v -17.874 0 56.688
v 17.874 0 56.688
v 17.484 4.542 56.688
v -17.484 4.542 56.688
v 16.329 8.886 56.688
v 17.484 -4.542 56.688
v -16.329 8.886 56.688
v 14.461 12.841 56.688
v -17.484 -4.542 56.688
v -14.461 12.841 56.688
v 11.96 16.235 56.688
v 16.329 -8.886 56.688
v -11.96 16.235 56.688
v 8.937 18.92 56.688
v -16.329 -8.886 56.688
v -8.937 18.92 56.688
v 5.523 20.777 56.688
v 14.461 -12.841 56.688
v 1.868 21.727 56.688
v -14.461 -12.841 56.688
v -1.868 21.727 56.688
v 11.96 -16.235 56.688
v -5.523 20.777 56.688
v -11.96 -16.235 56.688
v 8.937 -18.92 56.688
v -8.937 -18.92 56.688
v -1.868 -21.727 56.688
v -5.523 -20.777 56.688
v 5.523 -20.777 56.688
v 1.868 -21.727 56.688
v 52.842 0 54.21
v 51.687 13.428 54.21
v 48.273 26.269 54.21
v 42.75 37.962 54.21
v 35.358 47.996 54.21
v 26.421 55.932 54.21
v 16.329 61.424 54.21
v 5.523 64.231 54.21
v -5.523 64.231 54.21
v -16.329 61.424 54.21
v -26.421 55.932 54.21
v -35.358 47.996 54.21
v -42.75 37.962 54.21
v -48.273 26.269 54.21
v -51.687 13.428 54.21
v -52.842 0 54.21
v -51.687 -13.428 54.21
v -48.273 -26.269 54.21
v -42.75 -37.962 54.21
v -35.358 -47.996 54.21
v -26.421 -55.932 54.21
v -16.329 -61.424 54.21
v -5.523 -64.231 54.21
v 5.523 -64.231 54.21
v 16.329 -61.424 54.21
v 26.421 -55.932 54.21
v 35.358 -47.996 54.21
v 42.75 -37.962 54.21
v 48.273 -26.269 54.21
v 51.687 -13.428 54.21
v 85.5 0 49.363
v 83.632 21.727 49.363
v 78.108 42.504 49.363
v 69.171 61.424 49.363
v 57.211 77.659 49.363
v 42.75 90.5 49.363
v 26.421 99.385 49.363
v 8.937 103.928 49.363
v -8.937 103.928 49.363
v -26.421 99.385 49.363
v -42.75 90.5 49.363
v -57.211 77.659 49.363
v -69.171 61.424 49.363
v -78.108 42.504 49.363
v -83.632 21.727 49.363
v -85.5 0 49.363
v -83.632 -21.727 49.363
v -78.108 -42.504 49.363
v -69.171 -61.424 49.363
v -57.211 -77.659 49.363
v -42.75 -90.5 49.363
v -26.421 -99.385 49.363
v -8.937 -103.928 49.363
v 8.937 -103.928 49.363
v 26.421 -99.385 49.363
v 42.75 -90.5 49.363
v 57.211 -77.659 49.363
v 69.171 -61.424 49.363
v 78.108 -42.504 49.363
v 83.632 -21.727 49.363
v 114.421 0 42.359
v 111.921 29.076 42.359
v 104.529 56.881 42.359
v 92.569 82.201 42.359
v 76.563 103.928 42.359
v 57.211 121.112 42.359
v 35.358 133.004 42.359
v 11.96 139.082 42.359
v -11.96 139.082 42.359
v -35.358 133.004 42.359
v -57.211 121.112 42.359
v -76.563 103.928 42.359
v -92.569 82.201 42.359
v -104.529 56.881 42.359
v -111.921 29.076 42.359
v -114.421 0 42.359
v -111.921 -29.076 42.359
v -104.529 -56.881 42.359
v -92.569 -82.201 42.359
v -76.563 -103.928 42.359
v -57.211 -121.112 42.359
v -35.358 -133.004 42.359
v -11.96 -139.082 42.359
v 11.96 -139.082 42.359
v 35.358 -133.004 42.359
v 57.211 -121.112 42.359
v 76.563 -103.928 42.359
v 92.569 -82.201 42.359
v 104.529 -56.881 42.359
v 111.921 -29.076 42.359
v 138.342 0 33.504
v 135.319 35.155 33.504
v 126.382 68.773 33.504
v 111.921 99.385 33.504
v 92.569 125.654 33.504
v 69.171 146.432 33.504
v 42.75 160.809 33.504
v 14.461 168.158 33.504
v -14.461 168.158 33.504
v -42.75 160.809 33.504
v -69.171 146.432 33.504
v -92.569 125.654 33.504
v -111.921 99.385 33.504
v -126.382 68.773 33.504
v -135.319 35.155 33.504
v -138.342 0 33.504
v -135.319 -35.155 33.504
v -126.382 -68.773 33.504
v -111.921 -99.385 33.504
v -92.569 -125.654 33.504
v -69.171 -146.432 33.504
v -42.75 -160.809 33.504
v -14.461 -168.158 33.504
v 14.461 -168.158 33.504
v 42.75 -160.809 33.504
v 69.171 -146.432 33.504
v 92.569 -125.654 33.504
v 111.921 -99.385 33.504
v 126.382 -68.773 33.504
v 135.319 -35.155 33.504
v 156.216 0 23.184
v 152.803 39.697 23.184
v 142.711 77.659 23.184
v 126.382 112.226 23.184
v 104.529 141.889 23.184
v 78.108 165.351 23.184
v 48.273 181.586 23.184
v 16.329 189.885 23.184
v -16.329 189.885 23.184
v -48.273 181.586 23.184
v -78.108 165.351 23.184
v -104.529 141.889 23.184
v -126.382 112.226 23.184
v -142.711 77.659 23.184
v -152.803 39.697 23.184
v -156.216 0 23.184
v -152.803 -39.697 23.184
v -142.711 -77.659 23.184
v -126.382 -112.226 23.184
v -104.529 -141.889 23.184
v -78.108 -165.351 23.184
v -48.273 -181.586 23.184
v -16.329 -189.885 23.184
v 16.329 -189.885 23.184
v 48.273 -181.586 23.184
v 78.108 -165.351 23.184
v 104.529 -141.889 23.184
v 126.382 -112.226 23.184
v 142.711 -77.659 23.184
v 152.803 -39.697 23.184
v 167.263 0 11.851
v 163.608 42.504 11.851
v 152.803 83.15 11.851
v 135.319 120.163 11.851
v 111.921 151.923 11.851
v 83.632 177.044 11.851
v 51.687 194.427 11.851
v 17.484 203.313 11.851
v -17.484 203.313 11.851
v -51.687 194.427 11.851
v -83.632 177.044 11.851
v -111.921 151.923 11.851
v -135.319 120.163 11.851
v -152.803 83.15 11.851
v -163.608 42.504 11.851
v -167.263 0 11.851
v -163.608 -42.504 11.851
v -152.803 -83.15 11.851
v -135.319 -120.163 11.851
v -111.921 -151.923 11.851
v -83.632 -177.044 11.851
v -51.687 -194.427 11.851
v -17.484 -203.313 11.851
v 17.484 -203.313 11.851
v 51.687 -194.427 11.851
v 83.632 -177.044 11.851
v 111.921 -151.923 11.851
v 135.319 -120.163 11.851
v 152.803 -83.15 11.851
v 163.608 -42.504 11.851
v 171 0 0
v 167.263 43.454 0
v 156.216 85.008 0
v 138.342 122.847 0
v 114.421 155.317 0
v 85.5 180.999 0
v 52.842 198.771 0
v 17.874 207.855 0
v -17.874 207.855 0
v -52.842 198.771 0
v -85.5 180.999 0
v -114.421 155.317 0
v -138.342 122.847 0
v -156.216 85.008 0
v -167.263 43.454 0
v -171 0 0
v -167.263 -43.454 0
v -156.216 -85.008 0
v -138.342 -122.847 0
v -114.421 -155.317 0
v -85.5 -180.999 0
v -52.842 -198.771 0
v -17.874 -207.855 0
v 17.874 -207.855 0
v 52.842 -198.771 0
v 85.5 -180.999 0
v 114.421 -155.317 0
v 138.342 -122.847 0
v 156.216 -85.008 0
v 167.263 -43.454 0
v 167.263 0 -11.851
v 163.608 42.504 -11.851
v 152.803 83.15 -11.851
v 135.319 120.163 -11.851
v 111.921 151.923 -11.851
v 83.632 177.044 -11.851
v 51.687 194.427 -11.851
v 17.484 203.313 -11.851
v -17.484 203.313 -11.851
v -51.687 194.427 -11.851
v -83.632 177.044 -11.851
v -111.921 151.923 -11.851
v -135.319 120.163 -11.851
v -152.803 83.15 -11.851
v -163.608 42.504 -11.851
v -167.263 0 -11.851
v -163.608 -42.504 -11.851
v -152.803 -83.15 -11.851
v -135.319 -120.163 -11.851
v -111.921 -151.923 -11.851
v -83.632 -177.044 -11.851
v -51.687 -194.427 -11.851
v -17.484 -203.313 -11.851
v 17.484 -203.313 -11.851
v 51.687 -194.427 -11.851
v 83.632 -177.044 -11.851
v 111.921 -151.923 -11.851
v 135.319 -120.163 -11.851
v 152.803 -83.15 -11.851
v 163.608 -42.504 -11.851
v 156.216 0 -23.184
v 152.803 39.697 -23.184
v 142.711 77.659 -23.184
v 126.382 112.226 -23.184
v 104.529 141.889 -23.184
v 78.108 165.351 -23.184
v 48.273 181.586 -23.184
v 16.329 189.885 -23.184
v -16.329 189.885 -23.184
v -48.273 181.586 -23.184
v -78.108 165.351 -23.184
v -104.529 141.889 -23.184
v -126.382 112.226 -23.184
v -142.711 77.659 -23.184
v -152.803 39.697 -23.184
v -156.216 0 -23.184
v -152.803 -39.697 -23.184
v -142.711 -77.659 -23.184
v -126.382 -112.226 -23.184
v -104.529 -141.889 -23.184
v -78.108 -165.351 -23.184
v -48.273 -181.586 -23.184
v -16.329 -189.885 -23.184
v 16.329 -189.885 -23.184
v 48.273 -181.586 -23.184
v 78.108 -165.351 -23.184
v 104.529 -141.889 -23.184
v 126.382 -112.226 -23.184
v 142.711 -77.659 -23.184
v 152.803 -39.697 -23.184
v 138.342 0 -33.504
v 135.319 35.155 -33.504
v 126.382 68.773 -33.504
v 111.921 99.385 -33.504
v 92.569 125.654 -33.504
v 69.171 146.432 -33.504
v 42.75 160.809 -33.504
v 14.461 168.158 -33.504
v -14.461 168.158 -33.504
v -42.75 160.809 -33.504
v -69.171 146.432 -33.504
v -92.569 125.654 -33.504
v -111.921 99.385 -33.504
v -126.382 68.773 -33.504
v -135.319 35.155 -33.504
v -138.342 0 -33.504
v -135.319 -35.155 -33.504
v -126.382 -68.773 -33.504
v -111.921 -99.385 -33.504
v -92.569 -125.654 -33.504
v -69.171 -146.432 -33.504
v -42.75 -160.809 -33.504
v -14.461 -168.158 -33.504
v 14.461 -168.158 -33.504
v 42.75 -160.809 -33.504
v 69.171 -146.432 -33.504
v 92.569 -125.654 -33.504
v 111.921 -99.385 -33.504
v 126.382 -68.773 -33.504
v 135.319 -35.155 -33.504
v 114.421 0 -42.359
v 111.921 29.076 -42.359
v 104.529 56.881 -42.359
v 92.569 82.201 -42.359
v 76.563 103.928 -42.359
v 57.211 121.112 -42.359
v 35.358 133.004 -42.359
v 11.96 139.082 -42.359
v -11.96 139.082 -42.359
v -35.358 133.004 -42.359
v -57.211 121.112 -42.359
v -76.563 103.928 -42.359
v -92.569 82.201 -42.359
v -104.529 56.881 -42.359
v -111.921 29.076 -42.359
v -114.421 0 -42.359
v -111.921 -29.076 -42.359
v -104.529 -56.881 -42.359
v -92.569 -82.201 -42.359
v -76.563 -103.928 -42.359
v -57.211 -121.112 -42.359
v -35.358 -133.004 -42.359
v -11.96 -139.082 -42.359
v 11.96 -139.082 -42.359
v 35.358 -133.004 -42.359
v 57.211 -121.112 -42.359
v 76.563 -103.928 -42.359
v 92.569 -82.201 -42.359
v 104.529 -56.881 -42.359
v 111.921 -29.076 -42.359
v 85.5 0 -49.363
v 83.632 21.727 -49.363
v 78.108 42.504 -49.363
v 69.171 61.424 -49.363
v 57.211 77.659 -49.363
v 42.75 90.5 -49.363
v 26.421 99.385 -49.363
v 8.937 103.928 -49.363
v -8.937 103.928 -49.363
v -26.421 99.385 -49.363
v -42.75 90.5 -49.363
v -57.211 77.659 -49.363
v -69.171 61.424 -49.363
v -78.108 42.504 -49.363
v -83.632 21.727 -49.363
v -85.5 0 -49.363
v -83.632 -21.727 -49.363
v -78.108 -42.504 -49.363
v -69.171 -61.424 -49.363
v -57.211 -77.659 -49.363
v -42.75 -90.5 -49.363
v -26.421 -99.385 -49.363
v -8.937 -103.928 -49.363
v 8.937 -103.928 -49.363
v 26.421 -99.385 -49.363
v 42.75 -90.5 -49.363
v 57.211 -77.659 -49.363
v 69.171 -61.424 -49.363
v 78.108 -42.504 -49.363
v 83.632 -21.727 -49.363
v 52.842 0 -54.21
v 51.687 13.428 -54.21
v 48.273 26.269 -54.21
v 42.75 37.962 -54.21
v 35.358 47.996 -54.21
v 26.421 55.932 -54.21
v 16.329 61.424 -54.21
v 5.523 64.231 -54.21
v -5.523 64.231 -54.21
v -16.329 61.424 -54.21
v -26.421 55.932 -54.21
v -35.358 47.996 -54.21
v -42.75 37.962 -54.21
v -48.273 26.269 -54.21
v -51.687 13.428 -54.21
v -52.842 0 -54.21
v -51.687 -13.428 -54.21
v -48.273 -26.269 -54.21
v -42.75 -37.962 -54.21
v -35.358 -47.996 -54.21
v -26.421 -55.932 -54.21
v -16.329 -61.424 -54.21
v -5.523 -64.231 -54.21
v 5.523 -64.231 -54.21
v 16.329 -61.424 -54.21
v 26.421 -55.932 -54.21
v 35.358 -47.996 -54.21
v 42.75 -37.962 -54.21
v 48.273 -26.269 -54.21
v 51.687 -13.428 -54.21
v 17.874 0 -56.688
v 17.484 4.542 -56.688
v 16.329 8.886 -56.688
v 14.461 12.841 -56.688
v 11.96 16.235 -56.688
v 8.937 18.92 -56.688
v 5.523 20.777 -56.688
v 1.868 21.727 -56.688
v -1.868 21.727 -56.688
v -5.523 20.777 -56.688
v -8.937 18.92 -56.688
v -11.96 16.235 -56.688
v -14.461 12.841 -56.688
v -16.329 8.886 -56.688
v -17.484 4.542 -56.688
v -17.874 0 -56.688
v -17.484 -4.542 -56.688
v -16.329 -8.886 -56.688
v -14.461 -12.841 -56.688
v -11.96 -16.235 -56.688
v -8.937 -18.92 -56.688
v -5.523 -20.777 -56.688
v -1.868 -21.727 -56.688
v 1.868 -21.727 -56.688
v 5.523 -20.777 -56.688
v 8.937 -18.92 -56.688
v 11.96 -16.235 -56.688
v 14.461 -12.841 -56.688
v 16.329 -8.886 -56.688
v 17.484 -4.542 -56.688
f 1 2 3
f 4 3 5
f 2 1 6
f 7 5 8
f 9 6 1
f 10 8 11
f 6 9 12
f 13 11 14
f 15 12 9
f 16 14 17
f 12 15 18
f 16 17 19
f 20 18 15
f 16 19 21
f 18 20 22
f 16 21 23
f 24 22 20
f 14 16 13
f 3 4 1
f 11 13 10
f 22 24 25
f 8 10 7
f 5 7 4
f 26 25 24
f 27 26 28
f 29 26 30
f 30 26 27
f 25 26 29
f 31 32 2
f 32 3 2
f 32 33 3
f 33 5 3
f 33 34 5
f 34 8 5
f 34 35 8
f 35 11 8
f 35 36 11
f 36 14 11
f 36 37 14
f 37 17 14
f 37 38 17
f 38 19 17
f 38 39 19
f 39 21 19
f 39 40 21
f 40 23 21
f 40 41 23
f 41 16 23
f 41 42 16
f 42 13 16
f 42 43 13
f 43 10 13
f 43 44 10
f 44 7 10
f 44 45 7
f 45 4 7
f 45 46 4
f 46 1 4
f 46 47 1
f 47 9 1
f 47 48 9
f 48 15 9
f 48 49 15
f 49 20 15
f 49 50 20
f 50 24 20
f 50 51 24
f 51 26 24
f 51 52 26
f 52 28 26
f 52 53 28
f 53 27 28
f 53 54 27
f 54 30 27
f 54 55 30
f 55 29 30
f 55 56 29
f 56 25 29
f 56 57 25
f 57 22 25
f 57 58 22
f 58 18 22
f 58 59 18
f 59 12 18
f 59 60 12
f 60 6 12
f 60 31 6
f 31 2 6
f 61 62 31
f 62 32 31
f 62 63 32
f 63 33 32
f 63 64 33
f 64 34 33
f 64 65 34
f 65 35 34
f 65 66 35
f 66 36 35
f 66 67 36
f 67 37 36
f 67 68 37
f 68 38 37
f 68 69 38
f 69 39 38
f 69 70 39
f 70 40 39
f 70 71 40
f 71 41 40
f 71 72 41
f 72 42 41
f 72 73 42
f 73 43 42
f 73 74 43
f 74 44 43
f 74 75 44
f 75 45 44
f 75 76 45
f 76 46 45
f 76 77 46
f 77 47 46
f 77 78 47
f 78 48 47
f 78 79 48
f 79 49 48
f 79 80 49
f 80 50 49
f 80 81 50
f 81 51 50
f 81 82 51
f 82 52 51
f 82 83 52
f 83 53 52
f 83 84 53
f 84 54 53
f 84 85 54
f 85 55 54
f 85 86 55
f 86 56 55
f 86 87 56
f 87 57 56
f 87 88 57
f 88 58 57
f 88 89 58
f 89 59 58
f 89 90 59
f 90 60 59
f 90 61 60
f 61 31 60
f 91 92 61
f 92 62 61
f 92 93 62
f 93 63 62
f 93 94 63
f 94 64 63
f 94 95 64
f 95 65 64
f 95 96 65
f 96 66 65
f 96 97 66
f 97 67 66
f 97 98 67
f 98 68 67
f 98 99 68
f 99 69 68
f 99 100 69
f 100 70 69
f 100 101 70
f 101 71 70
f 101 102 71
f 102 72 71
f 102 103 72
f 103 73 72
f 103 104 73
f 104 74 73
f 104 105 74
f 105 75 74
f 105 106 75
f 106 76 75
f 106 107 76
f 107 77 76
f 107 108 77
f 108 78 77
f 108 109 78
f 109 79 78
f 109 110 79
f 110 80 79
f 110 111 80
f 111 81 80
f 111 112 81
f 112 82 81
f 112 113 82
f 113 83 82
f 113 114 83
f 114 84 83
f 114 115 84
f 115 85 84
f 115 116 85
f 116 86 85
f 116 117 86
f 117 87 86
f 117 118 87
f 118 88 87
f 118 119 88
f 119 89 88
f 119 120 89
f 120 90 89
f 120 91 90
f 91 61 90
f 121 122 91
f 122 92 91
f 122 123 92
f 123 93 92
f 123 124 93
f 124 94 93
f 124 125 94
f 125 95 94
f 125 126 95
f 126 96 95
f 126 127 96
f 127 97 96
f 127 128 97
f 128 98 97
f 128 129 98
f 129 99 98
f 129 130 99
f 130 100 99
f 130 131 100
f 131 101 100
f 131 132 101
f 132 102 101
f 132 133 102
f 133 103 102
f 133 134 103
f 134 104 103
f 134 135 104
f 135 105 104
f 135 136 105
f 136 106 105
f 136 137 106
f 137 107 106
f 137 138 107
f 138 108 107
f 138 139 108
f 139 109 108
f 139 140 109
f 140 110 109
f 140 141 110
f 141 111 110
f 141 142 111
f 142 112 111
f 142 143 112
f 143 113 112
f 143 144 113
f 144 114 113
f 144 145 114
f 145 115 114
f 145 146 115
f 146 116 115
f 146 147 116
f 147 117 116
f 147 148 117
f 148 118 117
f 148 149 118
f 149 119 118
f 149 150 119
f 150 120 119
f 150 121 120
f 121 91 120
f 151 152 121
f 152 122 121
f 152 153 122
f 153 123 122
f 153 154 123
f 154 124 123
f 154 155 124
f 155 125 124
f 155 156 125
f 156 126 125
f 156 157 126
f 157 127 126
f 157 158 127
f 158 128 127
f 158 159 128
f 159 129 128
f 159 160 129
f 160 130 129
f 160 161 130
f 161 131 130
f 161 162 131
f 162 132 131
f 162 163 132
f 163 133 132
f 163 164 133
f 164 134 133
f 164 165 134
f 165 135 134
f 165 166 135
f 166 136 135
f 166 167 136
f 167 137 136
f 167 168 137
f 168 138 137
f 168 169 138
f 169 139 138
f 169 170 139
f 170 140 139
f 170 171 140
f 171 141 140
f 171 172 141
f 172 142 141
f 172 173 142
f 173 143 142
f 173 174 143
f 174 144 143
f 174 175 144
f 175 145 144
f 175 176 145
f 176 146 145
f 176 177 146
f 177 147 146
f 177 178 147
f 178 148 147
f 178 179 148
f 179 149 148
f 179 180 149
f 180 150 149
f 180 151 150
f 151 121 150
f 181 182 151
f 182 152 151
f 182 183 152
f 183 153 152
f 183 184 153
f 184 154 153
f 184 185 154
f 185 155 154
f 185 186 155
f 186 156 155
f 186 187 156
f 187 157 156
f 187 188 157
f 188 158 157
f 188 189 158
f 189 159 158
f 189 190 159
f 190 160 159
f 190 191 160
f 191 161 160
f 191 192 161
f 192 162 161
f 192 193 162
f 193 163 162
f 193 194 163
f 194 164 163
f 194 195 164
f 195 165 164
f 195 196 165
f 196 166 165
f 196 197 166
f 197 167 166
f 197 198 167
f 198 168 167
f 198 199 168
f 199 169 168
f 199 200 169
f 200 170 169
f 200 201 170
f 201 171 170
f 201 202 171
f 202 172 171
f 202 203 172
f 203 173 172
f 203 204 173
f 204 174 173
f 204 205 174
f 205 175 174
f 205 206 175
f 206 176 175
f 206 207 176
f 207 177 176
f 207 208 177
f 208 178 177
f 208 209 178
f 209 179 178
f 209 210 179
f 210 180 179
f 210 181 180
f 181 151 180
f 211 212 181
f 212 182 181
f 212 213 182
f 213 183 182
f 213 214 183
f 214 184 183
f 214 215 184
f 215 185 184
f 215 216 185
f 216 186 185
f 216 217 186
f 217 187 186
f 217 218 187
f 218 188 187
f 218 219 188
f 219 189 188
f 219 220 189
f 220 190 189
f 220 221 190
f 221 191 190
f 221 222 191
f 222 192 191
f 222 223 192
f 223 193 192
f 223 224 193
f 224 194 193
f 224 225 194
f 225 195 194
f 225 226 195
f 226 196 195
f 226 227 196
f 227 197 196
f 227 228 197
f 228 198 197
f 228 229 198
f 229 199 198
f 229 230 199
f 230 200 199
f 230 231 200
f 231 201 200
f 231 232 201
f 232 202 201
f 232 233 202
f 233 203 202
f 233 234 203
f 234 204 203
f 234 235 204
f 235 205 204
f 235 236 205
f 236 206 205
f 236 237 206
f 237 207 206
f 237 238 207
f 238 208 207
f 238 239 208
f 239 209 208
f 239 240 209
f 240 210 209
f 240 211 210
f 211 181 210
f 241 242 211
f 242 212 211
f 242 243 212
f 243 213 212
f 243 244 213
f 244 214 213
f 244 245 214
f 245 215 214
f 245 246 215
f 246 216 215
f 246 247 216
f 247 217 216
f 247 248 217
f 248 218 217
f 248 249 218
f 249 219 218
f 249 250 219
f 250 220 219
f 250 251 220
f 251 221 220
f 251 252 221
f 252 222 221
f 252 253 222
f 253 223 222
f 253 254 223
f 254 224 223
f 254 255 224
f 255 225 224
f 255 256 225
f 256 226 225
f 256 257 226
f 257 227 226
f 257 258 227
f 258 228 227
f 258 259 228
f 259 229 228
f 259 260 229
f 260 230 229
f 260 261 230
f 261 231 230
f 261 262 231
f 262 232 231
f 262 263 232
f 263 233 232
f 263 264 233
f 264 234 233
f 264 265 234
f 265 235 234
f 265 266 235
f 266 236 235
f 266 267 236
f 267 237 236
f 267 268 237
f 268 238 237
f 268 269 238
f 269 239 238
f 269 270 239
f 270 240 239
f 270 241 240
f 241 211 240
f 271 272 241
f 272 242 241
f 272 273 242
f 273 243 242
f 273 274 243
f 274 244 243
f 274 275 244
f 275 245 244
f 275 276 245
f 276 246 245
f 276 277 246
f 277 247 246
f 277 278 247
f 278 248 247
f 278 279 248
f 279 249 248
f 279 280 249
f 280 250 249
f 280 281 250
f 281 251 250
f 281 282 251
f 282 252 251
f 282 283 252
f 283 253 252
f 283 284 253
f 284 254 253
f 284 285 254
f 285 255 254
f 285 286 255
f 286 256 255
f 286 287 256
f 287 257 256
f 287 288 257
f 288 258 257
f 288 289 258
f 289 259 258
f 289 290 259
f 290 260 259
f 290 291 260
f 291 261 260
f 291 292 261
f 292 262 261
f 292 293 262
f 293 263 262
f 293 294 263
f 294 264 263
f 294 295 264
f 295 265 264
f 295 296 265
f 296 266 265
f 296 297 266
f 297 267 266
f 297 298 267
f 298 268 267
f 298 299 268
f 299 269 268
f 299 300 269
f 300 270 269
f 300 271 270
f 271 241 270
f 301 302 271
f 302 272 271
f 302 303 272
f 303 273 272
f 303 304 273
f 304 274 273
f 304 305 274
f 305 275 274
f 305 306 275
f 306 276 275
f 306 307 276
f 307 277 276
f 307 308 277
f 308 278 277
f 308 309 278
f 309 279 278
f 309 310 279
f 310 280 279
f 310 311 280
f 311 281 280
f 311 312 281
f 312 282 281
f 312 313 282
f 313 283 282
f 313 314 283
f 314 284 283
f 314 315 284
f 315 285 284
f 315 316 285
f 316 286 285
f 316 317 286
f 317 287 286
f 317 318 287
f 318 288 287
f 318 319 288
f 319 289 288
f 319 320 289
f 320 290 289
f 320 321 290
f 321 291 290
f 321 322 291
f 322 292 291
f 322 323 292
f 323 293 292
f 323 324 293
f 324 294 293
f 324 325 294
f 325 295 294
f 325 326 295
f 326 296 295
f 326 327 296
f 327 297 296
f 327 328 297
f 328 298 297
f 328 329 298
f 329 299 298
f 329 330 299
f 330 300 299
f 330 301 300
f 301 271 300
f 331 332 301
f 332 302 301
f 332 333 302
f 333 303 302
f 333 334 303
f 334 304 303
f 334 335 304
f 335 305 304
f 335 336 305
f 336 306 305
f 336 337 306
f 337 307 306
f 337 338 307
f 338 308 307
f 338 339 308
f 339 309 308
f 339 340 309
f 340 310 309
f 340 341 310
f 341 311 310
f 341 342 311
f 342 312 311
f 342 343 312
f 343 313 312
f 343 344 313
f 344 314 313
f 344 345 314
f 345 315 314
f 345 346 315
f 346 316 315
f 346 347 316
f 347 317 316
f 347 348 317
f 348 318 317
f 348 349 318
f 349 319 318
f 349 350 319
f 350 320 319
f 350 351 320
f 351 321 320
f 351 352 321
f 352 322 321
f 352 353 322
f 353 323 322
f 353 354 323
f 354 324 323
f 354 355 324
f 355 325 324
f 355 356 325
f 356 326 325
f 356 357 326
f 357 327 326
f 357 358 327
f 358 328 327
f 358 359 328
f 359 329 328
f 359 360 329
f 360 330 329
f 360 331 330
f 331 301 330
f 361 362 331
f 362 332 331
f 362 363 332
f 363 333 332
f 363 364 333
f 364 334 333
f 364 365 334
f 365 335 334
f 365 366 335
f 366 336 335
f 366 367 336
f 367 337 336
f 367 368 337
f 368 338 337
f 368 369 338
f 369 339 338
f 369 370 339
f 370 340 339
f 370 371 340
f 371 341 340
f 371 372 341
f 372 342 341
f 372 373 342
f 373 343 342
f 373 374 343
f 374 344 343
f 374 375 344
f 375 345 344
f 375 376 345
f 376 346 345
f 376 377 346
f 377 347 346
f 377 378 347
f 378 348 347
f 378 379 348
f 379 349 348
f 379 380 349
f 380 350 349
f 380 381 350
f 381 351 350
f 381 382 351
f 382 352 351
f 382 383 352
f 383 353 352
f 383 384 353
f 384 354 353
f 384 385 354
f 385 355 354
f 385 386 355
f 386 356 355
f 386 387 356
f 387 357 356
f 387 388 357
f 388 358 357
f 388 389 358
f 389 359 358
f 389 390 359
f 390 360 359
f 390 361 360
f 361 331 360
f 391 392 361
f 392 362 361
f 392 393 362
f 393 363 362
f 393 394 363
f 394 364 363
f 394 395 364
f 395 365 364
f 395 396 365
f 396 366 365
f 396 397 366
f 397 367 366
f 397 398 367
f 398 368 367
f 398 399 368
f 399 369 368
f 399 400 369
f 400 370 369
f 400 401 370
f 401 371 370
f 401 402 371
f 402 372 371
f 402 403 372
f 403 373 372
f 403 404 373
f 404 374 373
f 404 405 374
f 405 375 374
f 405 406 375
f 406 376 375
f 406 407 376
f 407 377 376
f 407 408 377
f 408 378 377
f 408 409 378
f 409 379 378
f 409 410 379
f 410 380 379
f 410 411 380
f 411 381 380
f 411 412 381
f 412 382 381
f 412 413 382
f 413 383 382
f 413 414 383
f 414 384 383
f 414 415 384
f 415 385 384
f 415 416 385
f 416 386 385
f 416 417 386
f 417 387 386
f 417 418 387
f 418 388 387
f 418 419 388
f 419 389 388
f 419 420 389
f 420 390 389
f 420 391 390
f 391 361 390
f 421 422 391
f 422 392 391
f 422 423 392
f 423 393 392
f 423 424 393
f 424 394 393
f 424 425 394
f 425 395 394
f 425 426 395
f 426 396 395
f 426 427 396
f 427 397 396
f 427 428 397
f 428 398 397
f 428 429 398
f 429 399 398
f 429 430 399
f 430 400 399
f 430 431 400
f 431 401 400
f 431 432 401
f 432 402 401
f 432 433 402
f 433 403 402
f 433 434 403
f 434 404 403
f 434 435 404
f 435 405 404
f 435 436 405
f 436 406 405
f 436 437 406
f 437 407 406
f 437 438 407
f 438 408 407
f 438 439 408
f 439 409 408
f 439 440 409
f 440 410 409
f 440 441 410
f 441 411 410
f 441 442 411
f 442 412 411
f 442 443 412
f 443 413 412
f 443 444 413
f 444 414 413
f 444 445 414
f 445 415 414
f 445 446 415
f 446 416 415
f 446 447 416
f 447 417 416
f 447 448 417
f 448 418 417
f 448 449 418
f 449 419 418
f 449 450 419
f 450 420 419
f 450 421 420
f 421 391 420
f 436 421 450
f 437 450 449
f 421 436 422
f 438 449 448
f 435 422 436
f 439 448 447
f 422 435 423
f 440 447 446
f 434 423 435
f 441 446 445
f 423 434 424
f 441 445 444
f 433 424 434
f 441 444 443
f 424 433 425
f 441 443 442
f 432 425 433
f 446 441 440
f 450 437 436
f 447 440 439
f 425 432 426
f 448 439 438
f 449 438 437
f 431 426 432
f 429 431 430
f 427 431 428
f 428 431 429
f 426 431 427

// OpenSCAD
// Generated by SolidPython 1.0.1 on 2020-07-29 00:46:48


scale(v = [9, 11, 3]) {
	sphere(r = 19);
}
/***********************************************
*********      SolidPython code:      **********
************************************************
 
# import packages: SolidPython
from solid import *
from solid.utils import *
from itertools import chain, combinations, permutations


class Resize:

    def __init__(self, scad_file):
        self.scad_file = scad_file
        #self.scad_file = import_scad(scad_file)
        # cone/cylinder param:
        self.r1 = 0
        self.r2 = 0
        self.h = 0
        # rectangular prism param:
        self.w = 0
        self.l = 0
        # ellipse param:
        self.r = 0

    # import OpenScad code (file name corresponds to shape)


    # classify shape + parameters
    def assign(self, param1, param2, param3):
        if self.scad_file == 'cone.scad':
            self.r1 = param1
            self.r2 = param2
            self.h = param3
        elif self.scad_file == 'cylinder.scad':
            self.r1 = param1
            self.r2 = param2
            self.h = param3
        elif self.scad_file == 'rectangularPrism.scad':
            self.h = param1
            self.l = param2
            self.w = param3
        else:
            self.r = param1
            self.h = param2

    # resize parameters
    def iterate(self):
        x = range(3, 20, 2)
        i = 1
        if self.scad_file == 'cone.scad':
            tempList = list(permutations(x, 2))
            for temp in tempList:
                param1 = temp[0]
                param2 = temp[1]
                filepath = 'produced_scad_files/' + 'cone' + str(param1) + '_' + str(param2) + '_' + '.scad'
                scad_render_to_file(cylinder(h=param1, r1=param2, r2=0), filepath)

        elif self.scad_file == 'cylinder.scad':
            tempList = list(permutations(x, 3))
            for temp in tempList:
                param1 = temp[0]
                param2 = temp[1]
                filepath = 'produced_scad_files/' + 'cylinder' + str(param1) + '_' + str(param2) + '_' + '.scad'
                scad_render_to_file(cylinder(h=param1, r1=param2, r2=param2), filepath)

        elif self.scad_file == 'rectangularPrism.scad':
            tempList = list(permutations(x, 3))
            for temp in tempList:
                param1 = temp[0]
                param2 = temp[1]
                param3 = temp[2]
                filepath = 'produced_scad_files/' + 'rectangularPrism' + str(param1) + '_' + str(param2) + '_' + str(
                    param3) + '.scad'
                scad_render_to_file(cube(size=(param1, param2, param3)), filepath)

        elif self.scad_file == 'ellipse.scad':
            tempList = list(permutations(x, 4))
            for temp in tempList:
                param1 = temp[0]
                param2 = temp[1]
                param3 = temp[2]
                param4 = temp[3]
                filepath = 'produced_scad_files/' + 'ellipse' + str(param1) + '_' + str(param2) + '_' + str(param3) + '_' + str(param4) + '.scad'
                scad_render_to_file(scale([param1, param2, param3])(sphere(r=param4)), filepath)

    def render_to_scadfile(self):
        scad_render_to_file(scad, 'example.scad') 
 
************************************************/
